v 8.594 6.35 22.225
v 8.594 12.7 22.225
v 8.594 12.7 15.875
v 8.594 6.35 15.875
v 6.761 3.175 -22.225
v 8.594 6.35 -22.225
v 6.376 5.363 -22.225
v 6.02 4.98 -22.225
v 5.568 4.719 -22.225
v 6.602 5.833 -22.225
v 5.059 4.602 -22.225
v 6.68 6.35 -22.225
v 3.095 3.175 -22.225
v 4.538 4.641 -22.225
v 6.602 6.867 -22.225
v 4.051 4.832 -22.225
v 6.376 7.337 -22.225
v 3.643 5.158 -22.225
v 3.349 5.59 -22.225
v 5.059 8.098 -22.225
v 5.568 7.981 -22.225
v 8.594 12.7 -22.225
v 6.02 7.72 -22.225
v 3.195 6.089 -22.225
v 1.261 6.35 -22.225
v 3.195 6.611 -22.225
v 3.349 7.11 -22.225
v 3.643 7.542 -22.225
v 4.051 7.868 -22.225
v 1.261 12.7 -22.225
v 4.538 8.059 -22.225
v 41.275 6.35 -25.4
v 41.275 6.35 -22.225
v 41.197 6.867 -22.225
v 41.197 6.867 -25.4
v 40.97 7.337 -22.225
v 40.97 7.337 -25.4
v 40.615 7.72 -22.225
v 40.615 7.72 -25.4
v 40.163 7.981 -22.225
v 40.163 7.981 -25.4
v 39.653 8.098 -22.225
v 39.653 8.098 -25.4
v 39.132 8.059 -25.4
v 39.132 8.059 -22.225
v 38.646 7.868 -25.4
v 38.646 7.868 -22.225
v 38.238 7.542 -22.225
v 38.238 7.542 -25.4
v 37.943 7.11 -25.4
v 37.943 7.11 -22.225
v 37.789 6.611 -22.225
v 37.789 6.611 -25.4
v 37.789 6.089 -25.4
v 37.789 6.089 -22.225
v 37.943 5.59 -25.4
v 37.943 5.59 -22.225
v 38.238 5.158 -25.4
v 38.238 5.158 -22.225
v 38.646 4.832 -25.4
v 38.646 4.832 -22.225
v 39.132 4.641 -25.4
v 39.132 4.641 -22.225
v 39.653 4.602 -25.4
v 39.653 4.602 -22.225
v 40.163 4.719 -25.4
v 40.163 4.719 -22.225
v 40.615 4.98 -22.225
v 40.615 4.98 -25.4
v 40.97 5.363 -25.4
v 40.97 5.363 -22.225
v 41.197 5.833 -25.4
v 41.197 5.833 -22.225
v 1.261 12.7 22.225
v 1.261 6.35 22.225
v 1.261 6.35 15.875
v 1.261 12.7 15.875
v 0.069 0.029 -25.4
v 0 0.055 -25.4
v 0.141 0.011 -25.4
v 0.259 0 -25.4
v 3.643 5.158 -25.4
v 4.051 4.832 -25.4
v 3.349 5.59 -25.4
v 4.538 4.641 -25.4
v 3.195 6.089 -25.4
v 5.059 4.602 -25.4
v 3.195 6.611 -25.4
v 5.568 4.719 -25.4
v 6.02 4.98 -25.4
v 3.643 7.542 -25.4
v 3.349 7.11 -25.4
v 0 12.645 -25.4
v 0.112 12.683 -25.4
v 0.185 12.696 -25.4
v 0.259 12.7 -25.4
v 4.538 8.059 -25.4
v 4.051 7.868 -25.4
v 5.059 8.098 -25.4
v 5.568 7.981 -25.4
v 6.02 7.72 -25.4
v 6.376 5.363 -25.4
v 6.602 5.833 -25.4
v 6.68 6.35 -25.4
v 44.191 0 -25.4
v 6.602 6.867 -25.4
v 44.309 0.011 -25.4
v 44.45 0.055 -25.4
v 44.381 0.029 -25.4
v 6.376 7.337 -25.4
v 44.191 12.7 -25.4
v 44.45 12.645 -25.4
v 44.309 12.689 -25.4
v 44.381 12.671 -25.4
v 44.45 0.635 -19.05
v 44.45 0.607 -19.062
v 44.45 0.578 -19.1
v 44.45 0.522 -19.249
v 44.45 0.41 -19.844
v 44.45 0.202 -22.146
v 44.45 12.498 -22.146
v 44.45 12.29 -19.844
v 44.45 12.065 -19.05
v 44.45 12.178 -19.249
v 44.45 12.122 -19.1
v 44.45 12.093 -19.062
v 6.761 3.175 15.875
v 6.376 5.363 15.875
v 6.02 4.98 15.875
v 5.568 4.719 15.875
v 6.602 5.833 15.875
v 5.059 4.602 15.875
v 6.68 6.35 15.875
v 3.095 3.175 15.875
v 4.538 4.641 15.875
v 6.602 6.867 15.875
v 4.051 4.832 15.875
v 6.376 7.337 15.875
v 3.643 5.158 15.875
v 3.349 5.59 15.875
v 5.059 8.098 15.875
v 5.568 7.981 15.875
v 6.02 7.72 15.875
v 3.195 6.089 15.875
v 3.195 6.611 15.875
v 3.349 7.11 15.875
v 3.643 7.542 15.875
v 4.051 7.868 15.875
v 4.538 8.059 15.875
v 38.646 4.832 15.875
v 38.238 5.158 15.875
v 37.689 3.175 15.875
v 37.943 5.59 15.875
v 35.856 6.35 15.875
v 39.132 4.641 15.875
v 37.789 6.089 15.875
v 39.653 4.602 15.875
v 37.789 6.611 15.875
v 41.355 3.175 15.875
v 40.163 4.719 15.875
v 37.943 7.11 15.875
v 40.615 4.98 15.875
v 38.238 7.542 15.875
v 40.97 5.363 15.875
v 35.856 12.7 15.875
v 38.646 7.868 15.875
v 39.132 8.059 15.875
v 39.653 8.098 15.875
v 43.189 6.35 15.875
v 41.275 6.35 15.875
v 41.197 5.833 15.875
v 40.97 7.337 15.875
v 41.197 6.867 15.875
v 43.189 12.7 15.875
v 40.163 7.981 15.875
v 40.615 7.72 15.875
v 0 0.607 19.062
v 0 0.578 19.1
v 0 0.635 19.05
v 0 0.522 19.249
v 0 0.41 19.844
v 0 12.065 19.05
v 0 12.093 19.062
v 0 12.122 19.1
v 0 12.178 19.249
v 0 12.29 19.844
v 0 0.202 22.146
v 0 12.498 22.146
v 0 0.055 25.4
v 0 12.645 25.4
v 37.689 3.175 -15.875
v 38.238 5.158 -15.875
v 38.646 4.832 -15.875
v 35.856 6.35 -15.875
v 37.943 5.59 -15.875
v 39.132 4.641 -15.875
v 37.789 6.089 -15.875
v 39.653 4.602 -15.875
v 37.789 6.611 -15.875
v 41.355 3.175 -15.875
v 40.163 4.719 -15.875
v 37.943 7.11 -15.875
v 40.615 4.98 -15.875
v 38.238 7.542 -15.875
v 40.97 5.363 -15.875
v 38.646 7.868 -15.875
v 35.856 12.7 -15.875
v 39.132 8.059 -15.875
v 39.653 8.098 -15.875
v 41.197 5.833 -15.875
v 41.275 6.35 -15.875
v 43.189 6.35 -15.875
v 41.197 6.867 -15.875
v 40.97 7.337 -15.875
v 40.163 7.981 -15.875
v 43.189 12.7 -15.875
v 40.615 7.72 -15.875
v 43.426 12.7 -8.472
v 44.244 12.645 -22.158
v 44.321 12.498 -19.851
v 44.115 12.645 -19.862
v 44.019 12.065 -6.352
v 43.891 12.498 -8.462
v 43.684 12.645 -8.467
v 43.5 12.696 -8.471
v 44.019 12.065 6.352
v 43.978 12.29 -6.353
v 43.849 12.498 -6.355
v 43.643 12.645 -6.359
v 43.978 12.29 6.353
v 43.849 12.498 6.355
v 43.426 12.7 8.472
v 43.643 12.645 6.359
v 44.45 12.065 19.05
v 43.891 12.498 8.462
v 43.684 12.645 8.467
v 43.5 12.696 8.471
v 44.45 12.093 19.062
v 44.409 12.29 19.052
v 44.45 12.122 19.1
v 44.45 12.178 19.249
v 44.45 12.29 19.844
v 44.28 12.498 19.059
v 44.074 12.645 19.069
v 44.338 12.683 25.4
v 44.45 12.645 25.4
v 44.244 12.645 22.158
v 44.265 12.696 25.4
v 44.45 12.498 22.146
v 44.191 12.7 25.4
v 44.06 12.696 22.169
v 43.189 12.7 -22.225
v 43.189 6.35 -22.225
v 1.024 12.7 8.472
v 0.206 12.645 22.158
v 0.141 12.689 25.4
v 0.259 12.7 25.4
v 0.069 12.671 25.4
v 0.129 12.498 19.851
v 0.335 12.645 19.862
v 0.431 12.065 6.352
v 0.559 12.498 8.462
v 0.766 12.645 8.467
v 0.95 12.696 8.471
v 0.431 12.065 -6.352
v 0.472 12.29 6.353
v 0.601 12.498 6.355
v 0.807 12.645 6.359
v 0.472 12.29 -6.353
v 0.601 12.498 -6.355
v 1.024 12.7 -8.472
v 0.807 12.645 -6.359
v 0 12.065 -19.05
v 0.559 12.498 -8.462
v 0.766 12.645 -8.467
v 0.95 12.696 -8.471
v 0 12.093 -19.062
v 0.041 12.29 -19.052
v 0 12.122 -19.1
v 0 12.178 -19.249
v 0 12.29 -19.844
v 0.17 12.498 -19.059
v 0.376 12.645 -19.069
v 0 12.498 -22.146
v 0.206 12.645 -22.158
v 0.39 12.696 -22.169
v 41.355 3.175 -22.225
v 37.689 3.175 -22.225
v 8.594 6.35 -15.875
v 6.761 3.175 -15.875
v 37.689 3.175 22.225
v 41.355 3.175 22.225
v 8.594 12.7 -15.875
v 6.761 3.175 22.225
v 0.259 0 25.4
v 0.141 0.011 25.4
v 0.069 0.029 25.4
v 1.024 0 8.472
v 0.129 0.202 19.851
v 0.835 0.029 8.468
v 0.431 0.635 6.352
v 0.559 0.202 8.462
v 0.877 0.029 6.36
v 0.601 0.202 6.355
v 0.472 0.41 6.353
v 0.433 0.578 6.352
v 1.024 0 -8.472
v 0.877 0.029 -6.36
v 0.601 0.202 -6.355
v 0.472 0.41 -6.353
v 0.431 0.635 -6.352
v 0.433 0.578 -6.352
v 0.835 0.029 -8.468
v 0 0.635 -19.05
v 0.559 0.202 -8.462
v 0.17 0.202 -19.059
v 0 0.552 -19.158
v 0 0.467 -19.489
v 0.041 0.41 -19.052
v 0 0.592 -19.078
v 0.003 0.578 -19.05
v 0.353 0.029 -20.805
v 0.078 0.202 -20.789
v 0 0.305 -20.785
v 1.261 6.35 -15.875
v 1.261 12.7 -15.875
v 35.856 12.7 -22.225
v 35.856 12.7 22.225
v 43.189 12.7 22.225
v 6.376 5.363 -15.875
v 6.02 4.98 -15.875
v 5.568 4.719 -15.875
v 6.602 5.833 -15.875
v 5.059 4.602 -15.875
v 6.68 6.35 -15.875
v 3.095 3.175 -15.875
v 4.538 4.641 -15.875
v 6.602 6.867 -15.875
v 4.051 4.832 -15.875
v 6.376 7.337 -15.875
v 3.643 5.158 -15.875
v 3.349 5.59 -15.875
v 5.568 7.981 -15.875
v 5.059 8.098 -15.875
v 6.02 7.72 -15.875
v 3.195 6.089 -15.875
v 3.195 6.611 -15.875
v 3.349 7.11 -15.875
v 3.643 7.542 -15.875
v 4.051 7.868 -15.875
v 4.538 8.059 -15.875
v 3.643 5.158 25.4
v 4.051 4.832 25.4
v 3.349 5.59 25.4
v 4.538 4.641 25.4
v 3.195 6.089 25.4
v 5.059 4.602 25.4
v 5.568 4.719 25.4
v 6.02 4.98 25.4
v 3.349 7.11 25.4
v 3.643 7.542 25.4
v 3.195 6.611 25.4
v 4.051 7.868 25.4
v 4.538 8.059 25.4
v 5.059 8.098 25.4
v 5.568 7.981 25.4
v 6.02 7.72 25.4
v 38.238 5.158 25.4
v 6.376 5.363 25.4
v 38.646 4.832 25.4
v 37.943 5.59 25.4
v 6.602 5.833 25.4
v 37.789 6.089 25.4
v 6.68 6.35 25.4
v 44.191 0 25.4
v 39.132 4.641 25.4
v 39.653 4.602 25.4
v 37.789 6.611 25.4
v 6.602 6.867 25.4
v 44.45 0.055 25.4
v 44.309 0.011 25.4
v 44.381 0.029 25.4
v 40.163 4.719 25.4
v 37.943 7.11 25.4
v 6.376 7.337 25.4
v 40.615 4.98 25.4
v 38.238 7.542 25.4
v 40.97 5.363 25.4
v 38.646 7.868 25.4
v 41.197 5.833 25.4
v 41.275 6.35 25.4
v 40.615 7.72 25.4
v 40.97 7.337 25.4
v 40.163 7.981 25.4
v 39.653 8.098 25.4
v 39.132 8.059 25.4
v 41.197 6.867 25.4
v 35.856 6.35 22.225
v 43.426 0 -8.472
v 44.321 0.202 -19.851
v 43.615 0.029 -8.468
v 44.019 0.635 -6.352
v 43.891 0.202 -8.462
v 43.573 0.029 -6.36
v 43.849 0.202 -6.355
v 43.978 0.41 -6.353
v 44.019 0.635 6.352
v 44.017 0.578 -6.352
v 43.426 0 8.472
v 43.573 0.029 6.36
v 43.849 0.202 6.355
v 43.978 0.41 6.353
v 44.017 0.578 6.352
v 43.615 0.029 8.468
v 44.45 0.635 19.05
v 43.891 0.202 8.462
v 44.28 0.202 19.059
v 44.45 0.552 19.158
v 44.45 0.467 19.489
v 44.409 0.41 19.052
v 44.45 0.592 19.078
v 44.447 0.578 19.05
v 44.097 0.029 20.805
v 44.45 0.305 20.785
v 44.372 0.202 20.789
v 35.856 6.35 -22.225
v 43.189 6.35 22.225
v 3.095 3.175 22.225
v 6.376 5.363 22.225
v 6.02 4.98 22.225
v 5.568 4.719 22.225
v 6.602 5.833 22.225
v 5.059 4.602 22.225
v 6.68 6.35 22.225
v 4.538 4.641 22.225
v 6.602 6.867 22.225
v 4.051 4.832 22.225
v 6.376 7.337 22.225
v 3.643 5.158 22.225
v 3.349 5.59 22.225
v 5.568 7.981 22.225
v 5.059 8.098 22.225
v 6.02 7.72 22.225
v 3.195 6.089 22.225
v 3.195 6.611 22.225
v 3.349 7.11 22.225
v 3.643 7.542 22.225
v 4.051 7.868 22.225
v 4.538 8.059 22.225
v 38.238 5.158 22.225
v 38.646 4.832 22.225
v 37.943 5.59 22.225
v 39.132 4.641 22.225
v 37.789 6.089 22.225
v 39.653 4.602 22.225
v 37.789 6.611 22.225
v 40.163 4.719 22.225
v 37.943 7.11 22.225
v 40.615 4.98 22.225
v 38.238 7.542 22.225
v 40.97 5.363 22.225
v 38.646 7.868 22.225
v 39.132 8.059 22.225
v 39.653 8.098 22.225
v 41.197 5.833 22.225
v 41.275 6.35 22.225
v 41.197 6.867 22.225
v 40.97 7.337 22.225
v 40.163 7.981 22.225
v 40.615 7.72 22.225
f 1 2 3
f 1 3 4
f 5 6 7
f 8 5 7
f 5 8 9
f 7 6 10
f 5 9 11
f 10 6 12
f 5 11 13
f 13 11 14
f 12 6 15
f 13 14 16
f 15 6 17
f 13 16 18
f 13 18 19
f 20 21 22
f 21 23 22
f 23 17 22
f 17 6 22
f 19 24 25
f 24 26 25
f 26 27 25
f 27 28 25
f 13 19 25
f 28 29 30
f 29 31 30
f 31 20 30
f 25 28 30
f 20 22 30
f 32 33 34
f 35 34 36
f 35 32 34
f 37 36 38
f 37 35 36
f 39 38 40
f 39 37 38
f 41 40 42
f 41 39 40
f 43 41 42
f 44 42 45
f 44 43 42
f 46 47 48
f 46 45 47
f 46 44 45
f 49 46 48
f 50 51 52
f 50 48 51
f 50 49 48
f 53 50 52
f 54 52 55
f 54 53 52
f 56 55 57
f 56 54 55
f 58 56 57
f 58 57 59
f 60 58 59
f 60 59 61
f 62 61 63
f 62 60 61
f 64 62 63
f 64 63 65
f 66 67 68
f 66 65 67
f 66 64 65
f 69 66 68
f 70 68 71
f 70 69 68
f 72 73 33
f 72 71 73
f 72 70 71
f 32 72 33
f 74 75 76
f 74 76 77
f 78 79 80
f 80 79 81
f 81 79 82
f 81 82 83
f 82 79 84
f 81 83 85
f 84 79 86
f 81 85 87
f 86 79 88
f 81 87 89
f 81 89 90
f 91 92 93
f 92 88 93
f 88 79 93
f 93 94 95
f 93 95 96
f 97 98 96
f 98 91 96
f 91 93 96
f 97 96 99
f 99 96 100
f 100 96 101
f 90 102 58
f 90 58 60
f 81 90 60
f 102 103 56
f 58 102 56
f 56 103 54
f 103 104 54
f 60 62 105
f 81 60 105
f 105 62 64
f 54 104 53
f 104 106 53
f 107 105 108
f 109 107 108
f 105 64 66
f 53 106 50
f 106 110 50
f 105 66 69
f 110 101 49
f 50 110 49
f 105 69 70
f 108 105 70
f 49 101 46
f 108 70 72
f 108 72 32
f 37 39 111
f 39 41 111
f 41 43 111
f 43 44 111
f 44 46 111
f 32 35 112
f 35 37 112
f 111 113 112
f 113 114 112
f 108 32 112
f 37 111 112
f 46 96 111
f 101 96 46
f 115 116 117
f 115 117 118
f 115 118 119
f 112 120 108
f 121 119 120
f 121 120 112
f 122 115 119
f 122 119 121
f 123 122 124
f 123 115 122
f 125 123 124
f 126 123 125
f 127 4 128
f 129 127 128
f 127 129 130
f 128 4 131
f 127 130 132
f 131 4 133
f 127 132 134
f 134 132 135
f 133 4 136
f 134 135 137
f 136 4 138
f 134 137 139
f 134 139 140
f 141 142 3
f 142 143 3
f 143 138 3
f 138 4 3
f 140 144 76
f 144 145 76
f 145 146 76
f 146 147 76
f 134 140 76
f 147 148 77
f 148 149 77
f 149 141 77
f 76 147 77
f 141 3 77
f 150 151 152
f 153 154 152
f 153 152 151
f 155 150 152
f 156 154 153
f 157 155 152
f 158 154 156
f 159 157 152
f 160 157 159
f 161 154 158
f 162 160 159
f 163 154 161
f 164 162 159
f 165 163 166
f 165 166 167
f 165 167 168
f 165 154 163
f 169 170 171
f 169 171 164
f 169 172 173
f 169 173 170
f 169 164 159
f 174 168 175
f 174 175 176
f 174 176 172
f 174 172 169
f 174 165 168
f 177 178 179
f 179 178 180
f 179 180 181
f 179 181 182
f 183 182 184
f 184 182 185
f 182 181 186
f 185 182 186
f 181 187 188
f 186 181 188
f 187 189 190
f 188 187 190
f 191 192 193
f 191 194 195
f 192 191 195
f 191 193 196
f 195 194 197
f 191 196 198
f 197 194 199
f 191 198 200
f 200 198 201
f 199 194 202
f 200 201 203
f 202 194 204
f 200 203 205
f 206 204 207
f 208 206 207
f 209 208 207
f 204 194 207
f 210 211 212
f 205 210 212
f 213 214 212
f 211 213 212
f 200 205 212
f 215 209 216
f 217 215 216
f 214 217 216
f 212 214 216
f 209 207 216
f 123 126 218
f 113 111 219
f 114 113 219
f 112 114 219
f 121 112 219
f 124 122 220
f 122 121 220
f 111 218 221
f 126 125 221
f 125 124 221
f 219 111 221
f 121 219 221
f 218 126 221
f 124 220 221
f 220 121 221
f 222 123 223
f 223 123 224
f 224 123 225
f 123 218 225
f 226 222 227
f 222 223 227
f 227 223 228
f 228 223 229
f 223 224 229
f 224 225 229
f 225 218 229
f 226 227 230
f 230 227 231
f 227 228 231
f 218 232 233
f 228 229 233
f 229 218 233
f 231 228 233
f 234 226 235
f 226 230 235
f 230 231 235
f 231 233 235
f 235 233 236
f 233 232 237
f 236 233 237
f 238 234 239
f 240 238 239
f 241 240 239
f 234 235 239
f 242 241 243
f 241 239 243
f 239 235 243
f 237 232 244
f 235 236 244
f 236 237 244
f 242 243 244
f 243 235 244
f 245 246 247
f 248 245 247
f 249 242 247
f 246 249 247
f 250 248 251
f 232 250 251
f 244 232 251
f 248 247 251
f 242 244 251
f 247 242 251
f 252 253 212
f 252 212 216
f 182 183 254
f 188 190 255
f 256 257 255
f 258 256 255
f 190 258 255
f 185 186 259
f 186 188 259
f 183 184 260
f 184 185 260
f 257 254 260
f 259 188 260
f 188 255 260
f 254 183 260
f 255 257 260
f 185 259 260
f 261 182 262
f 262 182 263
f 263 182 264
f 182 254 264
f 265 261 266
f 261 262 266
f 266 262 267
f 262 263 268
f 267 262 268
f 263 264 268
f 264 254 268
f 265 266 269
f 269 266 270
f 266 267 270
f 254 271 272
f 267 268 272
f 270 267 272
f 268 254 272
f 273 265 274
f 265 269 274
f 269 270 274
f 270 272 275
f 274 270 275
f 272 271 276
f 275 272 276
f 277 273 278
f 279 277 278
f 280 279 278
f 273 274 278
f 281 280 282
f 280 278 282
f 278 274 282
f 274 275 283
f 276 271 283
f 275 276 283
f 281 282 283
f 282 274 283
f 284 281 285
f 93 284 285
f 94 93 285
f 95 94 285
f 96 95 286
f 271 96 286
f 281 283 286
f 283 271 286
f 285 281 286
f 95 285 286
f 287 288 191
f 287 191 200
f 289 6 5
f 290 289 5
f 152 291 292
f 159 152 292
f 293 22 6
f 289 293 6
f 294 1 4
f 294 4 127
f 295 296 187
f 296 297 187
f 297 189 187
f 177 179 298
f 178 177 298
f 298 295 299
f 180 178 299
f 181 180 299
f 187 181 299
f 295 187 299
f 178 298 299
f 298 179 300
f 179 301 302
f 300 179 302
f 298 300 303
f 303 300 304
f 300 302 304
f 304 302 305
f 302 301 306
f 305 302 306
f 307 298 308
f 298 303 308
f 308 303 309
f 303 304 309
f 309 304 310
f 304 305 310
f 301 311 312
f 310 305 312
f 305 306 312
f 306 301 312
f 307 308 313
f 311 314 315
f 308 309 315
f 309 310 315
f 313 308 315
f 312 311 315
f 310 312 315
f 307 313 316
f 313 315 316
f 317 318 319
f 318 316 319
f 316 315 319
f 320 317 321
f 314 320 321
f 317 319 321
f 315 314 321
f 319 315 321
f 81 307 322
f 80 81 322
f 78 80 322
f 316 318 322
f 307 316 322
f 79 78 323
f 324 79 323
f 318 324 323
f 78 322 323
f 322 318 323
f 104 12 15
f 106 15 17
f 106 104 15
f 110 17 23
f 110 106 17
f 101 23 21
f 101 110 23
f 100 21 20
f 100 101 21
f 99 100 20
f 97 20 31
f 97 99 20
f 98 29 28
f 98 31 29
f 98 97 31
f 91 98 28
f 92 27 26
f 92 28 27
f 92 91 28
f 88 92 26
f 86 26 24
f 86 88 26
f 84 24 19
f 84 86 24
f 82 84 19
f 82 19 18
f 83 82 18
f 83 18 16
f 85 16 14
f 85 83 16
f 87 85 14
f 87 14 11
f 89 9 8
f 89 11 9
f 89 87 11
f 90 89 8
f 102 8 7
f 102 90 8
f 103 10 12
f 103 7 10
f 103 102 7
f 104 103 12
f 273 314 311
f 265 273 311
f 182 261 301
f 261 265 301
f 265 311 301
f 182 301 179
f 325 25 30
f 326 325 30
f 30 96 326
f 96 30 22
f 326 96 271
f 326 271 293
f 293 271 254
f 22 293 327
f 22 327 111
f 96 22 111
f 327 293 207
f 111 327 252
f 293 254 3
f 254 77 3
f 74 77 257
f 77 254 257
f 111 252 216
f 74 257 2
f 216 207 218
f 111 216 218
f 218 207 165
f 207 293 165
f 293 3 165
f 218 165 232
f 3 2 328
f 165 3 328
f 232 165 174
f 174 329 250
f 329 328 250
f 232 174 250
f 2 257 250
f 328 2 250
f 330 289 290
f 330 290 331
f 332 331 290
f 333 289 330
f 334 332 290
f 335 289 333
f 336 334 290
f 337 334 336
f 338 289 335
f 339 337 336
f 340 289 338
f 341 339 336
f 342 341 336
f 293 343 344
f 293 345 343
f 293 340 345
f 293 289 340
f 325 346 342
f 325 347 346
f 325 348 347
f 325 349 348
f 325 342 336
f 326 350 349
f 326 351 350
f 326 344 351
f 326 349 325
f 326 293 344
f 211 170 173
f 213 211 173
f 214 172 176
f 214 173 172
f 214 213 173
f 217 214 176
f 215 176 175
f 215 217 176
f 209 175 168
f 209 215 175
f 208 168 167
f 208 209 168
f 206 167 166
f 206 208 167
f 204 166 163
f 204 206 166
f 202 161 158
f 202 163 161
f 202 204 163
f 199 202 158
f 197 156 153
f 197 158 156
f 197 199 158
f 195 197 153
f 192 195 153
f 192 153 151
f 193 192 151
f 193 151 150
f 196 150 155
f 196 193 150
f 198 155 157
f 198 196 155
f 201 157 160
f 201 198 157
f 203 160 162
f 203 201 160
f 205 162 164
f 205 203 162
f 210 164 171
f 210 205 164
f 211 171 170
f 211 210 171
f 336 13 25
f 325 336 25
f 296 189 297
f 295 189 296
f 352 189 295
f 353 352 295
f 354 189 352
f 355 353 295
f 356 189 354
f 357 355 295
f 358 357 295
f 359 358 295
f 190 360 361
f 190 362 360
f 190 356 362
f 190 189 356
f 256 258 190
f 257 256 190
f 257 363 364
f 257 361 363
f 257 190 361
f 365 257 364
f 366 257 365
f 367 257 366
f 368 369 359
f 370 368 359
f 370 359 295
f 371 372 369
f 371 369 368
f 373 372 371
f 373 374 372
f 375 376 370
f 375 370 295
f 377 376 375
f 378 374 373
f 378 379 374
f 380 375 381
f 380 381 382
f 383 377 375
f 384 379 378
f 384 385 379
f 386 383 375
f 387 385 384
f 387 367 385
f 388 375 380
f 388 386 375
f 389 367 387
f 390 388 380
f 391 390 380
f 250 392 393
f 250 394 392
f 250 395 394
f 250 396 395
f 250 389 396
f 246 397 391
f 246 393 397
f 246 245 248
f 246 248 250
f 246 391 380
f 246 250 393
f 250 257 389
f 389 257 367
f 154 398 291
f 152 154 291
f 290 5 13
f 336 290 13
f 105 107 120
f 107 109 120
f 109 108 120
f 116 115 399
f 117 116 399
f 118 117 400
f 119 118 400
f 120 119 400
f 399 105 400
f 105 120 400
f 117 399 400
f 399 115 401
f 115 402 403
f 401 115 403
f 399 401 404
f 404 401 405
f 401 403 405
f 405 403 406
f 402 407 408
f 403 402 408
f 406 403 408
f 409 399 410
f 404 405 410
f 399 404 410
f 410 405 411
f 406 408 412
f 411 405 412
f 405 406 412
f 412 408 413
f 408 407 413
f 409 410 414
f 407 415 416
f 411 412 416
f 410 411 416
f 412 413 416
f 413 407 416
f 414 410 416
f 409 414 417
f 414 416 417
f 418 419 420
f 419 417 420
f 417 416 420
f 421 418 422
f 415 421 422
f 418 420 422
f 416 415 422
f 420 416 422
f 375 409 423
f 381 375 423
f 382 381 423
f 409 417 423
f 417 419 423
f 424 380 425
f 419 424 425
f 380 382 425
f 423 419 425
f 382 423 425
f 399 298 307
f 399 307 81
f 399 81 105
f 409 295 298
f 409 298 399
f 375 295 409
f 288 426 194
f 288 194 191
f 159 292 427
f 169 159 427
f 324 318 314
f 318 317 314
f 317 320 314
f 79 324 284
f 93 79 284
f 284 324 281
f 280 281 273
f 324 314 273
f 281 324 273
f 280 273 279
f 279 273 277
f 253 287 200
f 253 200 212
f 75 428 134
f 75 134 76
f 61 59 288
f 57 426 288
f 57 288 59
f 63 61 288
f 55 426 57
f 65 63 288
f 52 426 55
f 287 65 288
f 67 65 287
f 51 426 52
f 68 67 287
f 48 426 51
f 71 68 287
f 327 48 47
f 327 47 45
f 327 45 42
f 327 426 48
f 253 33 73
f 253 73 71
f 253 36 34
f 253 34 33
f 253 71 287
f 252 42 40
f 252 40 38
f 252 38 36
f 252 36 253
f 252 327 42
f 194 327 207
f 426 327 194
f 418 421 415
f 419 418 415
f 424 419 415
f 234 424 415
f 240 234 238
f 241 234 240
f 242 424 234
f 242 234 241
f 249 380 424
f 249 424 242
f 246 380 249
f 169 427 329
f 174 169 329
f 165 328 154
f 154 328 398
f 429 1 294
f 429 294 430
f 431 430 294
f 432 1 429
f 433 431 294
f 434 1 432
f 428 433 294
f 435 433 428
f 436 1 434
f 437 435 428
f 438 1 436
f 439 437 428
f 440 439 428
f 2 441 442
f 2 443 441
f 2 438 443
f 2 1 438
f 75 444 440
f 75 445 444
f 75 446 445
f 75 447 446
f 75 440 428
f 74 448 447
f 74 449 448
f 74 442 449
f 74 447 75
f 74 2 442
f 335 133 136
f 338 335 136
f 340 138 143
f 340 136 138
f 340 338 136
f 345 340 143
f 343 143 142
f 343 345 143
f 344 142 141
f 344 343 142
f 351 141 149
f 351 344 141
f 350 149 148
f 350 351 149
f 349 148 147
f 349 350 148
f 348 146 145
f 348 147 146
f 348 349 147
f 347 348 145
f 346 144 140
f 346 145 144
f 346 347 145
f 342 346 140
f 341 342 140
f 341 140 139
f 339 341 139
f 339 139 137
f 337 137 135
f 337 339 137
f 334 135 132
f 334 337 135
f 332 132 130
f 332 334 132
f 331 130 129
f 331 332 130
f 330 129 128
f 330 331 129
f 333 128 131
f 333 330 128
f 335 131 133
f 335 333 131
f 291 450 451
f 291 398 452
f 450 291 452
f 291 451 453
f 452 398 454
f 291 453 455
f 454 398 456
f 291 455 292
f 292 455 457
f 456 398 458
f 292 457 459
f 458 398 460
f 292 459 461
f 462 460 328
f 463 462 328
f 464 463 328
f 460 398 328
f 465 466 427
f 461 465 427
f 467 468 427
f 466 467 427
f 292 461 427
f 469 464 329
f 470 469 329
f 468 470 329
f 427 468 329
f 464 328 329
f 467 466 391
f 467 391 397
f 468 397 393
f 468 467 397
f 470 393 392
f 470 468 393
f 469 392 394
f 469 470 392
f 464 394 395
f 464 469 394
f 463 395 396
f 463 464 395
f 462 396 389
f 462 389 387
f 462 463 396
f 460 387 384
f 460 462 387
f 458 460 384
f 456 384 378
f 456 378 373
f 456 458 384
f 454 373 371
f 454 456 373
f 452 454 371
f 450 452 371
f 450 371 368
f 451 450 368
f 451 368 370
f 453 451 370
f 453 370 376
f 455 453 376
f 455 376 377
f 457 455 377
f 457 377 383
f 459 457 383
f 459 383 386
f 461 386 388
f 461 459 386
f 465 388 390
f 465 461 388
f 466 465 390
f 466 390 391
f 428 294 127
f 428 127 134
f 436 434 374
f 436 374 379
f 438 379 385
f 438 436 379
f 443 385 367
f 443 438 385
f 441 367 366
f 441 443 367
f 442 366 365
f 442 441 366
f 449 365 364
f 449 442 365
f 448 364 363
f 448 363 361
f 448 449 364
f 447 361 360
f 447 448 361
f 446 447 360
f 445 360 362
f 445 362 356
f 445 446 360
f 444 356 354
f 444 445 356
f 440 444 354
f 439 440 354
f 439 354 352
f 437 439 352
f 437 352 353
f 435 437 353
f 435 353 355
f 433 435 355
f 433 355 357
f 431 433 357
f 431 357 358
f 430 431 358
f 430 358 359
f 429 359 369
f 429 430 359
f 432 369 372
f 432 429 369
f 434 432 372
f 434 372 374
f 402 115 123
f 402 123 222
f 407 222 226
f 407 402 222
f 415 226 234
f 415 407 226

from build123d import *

# Parameters (mm, degrees)
SKETCH1_W           = 44.45
SKETCH1_H           = 12.7
SKETCH1_R           = 1.7526
BOSS_EXTRUDE1_DEPTH = 25.4
CUT_EXTRUDE1_START  = -3.175
CUT_EXTRUDE1_DEPTH  = 6.35
CUT_EXTRUDE2_START  = -47.625
CUT_EXTRUDE2_DEPTH  = 6.35
CUT_EXTRUDE3_DEPTH  = 53.74706153
FILLET1_ANGLE       = 7.76917
FILLET1_2_ANGLE     = 7.76917
FILLET1_3_ANGLE     = 7.76917
FILLET1_4_ANGLE     = 7.76917


with BuildPart() as part:
    # Sketch1 → Boss-Extrude1 (new, symmetric)
    with BuildSketch(Plane.XY):
        with Locations((22.225, 6.35)):
            Rectangle(SKETCH1_W, SKETCH1_H)
        with Locations((4.9276, 6.35)):
            Circle(SKETCH1_R, mode=Mode.SUBTRACT)
        with Locations((39.5224, 6.35)):
            Circle(SKETCH1_R, mode=Mode.SUBTRACT)
    extrude(amount=BOSS_EXTRUDE1_DEPTH, both=True)

    # Sketch2 → Cut-Extrude1 (cut)
    with BuildSketch(Plane.XY.offset(25.4).offset(CUT_EXTRUDE1_START)):
        Polygon((1.261425791, 6.35), (1.261425791, 14.915819411), (8.593774209, 14.915819411), (8.593774209, 6.35), (6.760687105, 3.175), (3.094512895, 3.175), align=None)
        Polygon((35.856225791, 6.35), (37.689312895, 3.175), (41.355487105, 3.175), (43.188574209, 6.35), (43.188574209, 16.066451869), (35.856225791, 16.066451869), align=None)
    extrude(amount=-CUT_EXTRUDE1_DEPTH, mode=Mode.SUBTRACT)

    # Sketch2<2> → Cut-Extrude2 (cut)
    with BuildSketch(Plane.XY.offset(25.4).offset(CUT_EXTRUDE2_START)):
        Polygon((1.261425791, 6.35), (1.261425791, 14.915819411), (8.593774209, 14.915819411), (8.593774209, 6.35), (6.760687105, 3.175), (3.094512895, 3.175), align=None)
        Polygon((35.856225791, 6.35), (37.689312895, 3.175), (41.355487105, 3.175), (43.188574209, 6.35), (43.188574209, 16.066451869), (35.856225791, 16.066451869), align=None)
    extrude(amount=CUT_EXTRUDE2_DEPTH, mode=Mode.SUBTRACT)

    # Sketch3 → Cut-Extrude3 (cut, through all)
    with BuildSketch(Plane.XZ):
        with BuildLine():
            Line((44.45, 19.05), (44.45, -19.05))
            ThreePointArc((44.45, -19.05), (43.965232978, 0), (44.45, 19.05))
        make_face()
        with BuildLine():
            Line((0, 19.05), (0, -19.05))
            ThreePointArc((0, -19.05), (0.484767022, 0), (0, 19.05))
        make_face()
    extrude(amount=-CUT_EXTRUDE3_DEPTH, mode=Mode.SUBTRACT)

    # Fillet1: read off the stored shape, not the designer's step
    # Fillet1 outline → Fillet1 (revolve, cut)
    with BuildSketch(Plane(origin=(418.513709618, 0, 0), x_dir=(-0.9977025418167154, 0, -0.0677468674734517), z_dir=(0.0677468674734517, 0, -0.9977025418167154))):
        with BuildLine():
            Line((374.54847664, 12.7), (374.54847664, 12.065))
            ThreePointArc((374.54847664, 12.065), (374.734463834, 12.514012806), (375.18347664, 12.7))
            Line((375.18347664, 12.7), (374.54847664, 12.7))
        make_face()
    revolve(axis=Axis((418.513709618, 0, 0), (0, 1, 0)), revolution_arc=FILLET1_ANGLE, mode=Mode.SUBTRACT)

    # Fillet1 2 outline → Fillet1 2 (revolve, cut)
    with BuildSketch(Plane(origin=(418.513709618, 0, 0), x_dir=(-0.9977025418167154, 0, -0.0677468674734517), z_dir=(0.0677468674734517, 0, -0.9977025418167154))):
        with BuildLine():
            ThreePointArc((375.18347664, 0), (374.734463834, 0.185987194), (374.54847664, 0.635))
            Line((374.54847664, 0.635), (374.54847664, 0))
            Line((374.54847664, 0), (375.18347664, 0))
        make_face()
    revolve(axis=Axis((418.513709618, 0, 0), (0, 1, 0)), revolution_arc=FILLET1_2_ANGLE, mode=Mode.SUBTRACT)

    # Fillet1 3 outline → Fillet1 3 (revolve, cut)
    with BuildSketch(Plane(origin=(-374.063709618, 0, 0), x_dir=(0.9977025418167152, 0, 0.06774686747345202), z_dir=(-0.06774686747345202, 0, 0.9977025418167152))):
        with BuildLine():
            Line((374.54847664, 12.7), (374.54847664, 12.065))
            ThreePointArc((374.54847664, 12.065), (374.734463834, 12.514012806), (375.18347664, 12.7))
            Line((375.18347664, 12.7), (374.54847664, 12.7))
        make_face()
    revolve(axis=Axis((-374.063709618, 0, 0), (0, 1, 0)), revolution_arc=FILLET1_3_ANGLE, mode=Mode.SUBTRACT)

    # Fillet1 4 outline → Fillet1 4 (revolve, cut)
    with BuildSketch(Plane(origin=(-374.063709618, 0, 0), x_dir=(0.9977025418167152, 0, 0.06774686747345202), z_dir=(-0.06774686747345202, 0, 0.9977025418167152))):
        with BuildLine():
            ThreePointArc((375.18347664, 0), (374.734463834, 0.185987194), (374.54847664, 0.635))
            Line((374.54847664, 0.635), (374.54847664, 0))
            Line((374.54847664, 0), (375.18347664, 0))
        make_face()
    revolve(axis=Axis((-374.063709618, 0, 0), (0, 1, 0)), revolution_arc=FILLET1_4_ANGLE, mode=Mode.SUBTRACT)


solid = part.part
